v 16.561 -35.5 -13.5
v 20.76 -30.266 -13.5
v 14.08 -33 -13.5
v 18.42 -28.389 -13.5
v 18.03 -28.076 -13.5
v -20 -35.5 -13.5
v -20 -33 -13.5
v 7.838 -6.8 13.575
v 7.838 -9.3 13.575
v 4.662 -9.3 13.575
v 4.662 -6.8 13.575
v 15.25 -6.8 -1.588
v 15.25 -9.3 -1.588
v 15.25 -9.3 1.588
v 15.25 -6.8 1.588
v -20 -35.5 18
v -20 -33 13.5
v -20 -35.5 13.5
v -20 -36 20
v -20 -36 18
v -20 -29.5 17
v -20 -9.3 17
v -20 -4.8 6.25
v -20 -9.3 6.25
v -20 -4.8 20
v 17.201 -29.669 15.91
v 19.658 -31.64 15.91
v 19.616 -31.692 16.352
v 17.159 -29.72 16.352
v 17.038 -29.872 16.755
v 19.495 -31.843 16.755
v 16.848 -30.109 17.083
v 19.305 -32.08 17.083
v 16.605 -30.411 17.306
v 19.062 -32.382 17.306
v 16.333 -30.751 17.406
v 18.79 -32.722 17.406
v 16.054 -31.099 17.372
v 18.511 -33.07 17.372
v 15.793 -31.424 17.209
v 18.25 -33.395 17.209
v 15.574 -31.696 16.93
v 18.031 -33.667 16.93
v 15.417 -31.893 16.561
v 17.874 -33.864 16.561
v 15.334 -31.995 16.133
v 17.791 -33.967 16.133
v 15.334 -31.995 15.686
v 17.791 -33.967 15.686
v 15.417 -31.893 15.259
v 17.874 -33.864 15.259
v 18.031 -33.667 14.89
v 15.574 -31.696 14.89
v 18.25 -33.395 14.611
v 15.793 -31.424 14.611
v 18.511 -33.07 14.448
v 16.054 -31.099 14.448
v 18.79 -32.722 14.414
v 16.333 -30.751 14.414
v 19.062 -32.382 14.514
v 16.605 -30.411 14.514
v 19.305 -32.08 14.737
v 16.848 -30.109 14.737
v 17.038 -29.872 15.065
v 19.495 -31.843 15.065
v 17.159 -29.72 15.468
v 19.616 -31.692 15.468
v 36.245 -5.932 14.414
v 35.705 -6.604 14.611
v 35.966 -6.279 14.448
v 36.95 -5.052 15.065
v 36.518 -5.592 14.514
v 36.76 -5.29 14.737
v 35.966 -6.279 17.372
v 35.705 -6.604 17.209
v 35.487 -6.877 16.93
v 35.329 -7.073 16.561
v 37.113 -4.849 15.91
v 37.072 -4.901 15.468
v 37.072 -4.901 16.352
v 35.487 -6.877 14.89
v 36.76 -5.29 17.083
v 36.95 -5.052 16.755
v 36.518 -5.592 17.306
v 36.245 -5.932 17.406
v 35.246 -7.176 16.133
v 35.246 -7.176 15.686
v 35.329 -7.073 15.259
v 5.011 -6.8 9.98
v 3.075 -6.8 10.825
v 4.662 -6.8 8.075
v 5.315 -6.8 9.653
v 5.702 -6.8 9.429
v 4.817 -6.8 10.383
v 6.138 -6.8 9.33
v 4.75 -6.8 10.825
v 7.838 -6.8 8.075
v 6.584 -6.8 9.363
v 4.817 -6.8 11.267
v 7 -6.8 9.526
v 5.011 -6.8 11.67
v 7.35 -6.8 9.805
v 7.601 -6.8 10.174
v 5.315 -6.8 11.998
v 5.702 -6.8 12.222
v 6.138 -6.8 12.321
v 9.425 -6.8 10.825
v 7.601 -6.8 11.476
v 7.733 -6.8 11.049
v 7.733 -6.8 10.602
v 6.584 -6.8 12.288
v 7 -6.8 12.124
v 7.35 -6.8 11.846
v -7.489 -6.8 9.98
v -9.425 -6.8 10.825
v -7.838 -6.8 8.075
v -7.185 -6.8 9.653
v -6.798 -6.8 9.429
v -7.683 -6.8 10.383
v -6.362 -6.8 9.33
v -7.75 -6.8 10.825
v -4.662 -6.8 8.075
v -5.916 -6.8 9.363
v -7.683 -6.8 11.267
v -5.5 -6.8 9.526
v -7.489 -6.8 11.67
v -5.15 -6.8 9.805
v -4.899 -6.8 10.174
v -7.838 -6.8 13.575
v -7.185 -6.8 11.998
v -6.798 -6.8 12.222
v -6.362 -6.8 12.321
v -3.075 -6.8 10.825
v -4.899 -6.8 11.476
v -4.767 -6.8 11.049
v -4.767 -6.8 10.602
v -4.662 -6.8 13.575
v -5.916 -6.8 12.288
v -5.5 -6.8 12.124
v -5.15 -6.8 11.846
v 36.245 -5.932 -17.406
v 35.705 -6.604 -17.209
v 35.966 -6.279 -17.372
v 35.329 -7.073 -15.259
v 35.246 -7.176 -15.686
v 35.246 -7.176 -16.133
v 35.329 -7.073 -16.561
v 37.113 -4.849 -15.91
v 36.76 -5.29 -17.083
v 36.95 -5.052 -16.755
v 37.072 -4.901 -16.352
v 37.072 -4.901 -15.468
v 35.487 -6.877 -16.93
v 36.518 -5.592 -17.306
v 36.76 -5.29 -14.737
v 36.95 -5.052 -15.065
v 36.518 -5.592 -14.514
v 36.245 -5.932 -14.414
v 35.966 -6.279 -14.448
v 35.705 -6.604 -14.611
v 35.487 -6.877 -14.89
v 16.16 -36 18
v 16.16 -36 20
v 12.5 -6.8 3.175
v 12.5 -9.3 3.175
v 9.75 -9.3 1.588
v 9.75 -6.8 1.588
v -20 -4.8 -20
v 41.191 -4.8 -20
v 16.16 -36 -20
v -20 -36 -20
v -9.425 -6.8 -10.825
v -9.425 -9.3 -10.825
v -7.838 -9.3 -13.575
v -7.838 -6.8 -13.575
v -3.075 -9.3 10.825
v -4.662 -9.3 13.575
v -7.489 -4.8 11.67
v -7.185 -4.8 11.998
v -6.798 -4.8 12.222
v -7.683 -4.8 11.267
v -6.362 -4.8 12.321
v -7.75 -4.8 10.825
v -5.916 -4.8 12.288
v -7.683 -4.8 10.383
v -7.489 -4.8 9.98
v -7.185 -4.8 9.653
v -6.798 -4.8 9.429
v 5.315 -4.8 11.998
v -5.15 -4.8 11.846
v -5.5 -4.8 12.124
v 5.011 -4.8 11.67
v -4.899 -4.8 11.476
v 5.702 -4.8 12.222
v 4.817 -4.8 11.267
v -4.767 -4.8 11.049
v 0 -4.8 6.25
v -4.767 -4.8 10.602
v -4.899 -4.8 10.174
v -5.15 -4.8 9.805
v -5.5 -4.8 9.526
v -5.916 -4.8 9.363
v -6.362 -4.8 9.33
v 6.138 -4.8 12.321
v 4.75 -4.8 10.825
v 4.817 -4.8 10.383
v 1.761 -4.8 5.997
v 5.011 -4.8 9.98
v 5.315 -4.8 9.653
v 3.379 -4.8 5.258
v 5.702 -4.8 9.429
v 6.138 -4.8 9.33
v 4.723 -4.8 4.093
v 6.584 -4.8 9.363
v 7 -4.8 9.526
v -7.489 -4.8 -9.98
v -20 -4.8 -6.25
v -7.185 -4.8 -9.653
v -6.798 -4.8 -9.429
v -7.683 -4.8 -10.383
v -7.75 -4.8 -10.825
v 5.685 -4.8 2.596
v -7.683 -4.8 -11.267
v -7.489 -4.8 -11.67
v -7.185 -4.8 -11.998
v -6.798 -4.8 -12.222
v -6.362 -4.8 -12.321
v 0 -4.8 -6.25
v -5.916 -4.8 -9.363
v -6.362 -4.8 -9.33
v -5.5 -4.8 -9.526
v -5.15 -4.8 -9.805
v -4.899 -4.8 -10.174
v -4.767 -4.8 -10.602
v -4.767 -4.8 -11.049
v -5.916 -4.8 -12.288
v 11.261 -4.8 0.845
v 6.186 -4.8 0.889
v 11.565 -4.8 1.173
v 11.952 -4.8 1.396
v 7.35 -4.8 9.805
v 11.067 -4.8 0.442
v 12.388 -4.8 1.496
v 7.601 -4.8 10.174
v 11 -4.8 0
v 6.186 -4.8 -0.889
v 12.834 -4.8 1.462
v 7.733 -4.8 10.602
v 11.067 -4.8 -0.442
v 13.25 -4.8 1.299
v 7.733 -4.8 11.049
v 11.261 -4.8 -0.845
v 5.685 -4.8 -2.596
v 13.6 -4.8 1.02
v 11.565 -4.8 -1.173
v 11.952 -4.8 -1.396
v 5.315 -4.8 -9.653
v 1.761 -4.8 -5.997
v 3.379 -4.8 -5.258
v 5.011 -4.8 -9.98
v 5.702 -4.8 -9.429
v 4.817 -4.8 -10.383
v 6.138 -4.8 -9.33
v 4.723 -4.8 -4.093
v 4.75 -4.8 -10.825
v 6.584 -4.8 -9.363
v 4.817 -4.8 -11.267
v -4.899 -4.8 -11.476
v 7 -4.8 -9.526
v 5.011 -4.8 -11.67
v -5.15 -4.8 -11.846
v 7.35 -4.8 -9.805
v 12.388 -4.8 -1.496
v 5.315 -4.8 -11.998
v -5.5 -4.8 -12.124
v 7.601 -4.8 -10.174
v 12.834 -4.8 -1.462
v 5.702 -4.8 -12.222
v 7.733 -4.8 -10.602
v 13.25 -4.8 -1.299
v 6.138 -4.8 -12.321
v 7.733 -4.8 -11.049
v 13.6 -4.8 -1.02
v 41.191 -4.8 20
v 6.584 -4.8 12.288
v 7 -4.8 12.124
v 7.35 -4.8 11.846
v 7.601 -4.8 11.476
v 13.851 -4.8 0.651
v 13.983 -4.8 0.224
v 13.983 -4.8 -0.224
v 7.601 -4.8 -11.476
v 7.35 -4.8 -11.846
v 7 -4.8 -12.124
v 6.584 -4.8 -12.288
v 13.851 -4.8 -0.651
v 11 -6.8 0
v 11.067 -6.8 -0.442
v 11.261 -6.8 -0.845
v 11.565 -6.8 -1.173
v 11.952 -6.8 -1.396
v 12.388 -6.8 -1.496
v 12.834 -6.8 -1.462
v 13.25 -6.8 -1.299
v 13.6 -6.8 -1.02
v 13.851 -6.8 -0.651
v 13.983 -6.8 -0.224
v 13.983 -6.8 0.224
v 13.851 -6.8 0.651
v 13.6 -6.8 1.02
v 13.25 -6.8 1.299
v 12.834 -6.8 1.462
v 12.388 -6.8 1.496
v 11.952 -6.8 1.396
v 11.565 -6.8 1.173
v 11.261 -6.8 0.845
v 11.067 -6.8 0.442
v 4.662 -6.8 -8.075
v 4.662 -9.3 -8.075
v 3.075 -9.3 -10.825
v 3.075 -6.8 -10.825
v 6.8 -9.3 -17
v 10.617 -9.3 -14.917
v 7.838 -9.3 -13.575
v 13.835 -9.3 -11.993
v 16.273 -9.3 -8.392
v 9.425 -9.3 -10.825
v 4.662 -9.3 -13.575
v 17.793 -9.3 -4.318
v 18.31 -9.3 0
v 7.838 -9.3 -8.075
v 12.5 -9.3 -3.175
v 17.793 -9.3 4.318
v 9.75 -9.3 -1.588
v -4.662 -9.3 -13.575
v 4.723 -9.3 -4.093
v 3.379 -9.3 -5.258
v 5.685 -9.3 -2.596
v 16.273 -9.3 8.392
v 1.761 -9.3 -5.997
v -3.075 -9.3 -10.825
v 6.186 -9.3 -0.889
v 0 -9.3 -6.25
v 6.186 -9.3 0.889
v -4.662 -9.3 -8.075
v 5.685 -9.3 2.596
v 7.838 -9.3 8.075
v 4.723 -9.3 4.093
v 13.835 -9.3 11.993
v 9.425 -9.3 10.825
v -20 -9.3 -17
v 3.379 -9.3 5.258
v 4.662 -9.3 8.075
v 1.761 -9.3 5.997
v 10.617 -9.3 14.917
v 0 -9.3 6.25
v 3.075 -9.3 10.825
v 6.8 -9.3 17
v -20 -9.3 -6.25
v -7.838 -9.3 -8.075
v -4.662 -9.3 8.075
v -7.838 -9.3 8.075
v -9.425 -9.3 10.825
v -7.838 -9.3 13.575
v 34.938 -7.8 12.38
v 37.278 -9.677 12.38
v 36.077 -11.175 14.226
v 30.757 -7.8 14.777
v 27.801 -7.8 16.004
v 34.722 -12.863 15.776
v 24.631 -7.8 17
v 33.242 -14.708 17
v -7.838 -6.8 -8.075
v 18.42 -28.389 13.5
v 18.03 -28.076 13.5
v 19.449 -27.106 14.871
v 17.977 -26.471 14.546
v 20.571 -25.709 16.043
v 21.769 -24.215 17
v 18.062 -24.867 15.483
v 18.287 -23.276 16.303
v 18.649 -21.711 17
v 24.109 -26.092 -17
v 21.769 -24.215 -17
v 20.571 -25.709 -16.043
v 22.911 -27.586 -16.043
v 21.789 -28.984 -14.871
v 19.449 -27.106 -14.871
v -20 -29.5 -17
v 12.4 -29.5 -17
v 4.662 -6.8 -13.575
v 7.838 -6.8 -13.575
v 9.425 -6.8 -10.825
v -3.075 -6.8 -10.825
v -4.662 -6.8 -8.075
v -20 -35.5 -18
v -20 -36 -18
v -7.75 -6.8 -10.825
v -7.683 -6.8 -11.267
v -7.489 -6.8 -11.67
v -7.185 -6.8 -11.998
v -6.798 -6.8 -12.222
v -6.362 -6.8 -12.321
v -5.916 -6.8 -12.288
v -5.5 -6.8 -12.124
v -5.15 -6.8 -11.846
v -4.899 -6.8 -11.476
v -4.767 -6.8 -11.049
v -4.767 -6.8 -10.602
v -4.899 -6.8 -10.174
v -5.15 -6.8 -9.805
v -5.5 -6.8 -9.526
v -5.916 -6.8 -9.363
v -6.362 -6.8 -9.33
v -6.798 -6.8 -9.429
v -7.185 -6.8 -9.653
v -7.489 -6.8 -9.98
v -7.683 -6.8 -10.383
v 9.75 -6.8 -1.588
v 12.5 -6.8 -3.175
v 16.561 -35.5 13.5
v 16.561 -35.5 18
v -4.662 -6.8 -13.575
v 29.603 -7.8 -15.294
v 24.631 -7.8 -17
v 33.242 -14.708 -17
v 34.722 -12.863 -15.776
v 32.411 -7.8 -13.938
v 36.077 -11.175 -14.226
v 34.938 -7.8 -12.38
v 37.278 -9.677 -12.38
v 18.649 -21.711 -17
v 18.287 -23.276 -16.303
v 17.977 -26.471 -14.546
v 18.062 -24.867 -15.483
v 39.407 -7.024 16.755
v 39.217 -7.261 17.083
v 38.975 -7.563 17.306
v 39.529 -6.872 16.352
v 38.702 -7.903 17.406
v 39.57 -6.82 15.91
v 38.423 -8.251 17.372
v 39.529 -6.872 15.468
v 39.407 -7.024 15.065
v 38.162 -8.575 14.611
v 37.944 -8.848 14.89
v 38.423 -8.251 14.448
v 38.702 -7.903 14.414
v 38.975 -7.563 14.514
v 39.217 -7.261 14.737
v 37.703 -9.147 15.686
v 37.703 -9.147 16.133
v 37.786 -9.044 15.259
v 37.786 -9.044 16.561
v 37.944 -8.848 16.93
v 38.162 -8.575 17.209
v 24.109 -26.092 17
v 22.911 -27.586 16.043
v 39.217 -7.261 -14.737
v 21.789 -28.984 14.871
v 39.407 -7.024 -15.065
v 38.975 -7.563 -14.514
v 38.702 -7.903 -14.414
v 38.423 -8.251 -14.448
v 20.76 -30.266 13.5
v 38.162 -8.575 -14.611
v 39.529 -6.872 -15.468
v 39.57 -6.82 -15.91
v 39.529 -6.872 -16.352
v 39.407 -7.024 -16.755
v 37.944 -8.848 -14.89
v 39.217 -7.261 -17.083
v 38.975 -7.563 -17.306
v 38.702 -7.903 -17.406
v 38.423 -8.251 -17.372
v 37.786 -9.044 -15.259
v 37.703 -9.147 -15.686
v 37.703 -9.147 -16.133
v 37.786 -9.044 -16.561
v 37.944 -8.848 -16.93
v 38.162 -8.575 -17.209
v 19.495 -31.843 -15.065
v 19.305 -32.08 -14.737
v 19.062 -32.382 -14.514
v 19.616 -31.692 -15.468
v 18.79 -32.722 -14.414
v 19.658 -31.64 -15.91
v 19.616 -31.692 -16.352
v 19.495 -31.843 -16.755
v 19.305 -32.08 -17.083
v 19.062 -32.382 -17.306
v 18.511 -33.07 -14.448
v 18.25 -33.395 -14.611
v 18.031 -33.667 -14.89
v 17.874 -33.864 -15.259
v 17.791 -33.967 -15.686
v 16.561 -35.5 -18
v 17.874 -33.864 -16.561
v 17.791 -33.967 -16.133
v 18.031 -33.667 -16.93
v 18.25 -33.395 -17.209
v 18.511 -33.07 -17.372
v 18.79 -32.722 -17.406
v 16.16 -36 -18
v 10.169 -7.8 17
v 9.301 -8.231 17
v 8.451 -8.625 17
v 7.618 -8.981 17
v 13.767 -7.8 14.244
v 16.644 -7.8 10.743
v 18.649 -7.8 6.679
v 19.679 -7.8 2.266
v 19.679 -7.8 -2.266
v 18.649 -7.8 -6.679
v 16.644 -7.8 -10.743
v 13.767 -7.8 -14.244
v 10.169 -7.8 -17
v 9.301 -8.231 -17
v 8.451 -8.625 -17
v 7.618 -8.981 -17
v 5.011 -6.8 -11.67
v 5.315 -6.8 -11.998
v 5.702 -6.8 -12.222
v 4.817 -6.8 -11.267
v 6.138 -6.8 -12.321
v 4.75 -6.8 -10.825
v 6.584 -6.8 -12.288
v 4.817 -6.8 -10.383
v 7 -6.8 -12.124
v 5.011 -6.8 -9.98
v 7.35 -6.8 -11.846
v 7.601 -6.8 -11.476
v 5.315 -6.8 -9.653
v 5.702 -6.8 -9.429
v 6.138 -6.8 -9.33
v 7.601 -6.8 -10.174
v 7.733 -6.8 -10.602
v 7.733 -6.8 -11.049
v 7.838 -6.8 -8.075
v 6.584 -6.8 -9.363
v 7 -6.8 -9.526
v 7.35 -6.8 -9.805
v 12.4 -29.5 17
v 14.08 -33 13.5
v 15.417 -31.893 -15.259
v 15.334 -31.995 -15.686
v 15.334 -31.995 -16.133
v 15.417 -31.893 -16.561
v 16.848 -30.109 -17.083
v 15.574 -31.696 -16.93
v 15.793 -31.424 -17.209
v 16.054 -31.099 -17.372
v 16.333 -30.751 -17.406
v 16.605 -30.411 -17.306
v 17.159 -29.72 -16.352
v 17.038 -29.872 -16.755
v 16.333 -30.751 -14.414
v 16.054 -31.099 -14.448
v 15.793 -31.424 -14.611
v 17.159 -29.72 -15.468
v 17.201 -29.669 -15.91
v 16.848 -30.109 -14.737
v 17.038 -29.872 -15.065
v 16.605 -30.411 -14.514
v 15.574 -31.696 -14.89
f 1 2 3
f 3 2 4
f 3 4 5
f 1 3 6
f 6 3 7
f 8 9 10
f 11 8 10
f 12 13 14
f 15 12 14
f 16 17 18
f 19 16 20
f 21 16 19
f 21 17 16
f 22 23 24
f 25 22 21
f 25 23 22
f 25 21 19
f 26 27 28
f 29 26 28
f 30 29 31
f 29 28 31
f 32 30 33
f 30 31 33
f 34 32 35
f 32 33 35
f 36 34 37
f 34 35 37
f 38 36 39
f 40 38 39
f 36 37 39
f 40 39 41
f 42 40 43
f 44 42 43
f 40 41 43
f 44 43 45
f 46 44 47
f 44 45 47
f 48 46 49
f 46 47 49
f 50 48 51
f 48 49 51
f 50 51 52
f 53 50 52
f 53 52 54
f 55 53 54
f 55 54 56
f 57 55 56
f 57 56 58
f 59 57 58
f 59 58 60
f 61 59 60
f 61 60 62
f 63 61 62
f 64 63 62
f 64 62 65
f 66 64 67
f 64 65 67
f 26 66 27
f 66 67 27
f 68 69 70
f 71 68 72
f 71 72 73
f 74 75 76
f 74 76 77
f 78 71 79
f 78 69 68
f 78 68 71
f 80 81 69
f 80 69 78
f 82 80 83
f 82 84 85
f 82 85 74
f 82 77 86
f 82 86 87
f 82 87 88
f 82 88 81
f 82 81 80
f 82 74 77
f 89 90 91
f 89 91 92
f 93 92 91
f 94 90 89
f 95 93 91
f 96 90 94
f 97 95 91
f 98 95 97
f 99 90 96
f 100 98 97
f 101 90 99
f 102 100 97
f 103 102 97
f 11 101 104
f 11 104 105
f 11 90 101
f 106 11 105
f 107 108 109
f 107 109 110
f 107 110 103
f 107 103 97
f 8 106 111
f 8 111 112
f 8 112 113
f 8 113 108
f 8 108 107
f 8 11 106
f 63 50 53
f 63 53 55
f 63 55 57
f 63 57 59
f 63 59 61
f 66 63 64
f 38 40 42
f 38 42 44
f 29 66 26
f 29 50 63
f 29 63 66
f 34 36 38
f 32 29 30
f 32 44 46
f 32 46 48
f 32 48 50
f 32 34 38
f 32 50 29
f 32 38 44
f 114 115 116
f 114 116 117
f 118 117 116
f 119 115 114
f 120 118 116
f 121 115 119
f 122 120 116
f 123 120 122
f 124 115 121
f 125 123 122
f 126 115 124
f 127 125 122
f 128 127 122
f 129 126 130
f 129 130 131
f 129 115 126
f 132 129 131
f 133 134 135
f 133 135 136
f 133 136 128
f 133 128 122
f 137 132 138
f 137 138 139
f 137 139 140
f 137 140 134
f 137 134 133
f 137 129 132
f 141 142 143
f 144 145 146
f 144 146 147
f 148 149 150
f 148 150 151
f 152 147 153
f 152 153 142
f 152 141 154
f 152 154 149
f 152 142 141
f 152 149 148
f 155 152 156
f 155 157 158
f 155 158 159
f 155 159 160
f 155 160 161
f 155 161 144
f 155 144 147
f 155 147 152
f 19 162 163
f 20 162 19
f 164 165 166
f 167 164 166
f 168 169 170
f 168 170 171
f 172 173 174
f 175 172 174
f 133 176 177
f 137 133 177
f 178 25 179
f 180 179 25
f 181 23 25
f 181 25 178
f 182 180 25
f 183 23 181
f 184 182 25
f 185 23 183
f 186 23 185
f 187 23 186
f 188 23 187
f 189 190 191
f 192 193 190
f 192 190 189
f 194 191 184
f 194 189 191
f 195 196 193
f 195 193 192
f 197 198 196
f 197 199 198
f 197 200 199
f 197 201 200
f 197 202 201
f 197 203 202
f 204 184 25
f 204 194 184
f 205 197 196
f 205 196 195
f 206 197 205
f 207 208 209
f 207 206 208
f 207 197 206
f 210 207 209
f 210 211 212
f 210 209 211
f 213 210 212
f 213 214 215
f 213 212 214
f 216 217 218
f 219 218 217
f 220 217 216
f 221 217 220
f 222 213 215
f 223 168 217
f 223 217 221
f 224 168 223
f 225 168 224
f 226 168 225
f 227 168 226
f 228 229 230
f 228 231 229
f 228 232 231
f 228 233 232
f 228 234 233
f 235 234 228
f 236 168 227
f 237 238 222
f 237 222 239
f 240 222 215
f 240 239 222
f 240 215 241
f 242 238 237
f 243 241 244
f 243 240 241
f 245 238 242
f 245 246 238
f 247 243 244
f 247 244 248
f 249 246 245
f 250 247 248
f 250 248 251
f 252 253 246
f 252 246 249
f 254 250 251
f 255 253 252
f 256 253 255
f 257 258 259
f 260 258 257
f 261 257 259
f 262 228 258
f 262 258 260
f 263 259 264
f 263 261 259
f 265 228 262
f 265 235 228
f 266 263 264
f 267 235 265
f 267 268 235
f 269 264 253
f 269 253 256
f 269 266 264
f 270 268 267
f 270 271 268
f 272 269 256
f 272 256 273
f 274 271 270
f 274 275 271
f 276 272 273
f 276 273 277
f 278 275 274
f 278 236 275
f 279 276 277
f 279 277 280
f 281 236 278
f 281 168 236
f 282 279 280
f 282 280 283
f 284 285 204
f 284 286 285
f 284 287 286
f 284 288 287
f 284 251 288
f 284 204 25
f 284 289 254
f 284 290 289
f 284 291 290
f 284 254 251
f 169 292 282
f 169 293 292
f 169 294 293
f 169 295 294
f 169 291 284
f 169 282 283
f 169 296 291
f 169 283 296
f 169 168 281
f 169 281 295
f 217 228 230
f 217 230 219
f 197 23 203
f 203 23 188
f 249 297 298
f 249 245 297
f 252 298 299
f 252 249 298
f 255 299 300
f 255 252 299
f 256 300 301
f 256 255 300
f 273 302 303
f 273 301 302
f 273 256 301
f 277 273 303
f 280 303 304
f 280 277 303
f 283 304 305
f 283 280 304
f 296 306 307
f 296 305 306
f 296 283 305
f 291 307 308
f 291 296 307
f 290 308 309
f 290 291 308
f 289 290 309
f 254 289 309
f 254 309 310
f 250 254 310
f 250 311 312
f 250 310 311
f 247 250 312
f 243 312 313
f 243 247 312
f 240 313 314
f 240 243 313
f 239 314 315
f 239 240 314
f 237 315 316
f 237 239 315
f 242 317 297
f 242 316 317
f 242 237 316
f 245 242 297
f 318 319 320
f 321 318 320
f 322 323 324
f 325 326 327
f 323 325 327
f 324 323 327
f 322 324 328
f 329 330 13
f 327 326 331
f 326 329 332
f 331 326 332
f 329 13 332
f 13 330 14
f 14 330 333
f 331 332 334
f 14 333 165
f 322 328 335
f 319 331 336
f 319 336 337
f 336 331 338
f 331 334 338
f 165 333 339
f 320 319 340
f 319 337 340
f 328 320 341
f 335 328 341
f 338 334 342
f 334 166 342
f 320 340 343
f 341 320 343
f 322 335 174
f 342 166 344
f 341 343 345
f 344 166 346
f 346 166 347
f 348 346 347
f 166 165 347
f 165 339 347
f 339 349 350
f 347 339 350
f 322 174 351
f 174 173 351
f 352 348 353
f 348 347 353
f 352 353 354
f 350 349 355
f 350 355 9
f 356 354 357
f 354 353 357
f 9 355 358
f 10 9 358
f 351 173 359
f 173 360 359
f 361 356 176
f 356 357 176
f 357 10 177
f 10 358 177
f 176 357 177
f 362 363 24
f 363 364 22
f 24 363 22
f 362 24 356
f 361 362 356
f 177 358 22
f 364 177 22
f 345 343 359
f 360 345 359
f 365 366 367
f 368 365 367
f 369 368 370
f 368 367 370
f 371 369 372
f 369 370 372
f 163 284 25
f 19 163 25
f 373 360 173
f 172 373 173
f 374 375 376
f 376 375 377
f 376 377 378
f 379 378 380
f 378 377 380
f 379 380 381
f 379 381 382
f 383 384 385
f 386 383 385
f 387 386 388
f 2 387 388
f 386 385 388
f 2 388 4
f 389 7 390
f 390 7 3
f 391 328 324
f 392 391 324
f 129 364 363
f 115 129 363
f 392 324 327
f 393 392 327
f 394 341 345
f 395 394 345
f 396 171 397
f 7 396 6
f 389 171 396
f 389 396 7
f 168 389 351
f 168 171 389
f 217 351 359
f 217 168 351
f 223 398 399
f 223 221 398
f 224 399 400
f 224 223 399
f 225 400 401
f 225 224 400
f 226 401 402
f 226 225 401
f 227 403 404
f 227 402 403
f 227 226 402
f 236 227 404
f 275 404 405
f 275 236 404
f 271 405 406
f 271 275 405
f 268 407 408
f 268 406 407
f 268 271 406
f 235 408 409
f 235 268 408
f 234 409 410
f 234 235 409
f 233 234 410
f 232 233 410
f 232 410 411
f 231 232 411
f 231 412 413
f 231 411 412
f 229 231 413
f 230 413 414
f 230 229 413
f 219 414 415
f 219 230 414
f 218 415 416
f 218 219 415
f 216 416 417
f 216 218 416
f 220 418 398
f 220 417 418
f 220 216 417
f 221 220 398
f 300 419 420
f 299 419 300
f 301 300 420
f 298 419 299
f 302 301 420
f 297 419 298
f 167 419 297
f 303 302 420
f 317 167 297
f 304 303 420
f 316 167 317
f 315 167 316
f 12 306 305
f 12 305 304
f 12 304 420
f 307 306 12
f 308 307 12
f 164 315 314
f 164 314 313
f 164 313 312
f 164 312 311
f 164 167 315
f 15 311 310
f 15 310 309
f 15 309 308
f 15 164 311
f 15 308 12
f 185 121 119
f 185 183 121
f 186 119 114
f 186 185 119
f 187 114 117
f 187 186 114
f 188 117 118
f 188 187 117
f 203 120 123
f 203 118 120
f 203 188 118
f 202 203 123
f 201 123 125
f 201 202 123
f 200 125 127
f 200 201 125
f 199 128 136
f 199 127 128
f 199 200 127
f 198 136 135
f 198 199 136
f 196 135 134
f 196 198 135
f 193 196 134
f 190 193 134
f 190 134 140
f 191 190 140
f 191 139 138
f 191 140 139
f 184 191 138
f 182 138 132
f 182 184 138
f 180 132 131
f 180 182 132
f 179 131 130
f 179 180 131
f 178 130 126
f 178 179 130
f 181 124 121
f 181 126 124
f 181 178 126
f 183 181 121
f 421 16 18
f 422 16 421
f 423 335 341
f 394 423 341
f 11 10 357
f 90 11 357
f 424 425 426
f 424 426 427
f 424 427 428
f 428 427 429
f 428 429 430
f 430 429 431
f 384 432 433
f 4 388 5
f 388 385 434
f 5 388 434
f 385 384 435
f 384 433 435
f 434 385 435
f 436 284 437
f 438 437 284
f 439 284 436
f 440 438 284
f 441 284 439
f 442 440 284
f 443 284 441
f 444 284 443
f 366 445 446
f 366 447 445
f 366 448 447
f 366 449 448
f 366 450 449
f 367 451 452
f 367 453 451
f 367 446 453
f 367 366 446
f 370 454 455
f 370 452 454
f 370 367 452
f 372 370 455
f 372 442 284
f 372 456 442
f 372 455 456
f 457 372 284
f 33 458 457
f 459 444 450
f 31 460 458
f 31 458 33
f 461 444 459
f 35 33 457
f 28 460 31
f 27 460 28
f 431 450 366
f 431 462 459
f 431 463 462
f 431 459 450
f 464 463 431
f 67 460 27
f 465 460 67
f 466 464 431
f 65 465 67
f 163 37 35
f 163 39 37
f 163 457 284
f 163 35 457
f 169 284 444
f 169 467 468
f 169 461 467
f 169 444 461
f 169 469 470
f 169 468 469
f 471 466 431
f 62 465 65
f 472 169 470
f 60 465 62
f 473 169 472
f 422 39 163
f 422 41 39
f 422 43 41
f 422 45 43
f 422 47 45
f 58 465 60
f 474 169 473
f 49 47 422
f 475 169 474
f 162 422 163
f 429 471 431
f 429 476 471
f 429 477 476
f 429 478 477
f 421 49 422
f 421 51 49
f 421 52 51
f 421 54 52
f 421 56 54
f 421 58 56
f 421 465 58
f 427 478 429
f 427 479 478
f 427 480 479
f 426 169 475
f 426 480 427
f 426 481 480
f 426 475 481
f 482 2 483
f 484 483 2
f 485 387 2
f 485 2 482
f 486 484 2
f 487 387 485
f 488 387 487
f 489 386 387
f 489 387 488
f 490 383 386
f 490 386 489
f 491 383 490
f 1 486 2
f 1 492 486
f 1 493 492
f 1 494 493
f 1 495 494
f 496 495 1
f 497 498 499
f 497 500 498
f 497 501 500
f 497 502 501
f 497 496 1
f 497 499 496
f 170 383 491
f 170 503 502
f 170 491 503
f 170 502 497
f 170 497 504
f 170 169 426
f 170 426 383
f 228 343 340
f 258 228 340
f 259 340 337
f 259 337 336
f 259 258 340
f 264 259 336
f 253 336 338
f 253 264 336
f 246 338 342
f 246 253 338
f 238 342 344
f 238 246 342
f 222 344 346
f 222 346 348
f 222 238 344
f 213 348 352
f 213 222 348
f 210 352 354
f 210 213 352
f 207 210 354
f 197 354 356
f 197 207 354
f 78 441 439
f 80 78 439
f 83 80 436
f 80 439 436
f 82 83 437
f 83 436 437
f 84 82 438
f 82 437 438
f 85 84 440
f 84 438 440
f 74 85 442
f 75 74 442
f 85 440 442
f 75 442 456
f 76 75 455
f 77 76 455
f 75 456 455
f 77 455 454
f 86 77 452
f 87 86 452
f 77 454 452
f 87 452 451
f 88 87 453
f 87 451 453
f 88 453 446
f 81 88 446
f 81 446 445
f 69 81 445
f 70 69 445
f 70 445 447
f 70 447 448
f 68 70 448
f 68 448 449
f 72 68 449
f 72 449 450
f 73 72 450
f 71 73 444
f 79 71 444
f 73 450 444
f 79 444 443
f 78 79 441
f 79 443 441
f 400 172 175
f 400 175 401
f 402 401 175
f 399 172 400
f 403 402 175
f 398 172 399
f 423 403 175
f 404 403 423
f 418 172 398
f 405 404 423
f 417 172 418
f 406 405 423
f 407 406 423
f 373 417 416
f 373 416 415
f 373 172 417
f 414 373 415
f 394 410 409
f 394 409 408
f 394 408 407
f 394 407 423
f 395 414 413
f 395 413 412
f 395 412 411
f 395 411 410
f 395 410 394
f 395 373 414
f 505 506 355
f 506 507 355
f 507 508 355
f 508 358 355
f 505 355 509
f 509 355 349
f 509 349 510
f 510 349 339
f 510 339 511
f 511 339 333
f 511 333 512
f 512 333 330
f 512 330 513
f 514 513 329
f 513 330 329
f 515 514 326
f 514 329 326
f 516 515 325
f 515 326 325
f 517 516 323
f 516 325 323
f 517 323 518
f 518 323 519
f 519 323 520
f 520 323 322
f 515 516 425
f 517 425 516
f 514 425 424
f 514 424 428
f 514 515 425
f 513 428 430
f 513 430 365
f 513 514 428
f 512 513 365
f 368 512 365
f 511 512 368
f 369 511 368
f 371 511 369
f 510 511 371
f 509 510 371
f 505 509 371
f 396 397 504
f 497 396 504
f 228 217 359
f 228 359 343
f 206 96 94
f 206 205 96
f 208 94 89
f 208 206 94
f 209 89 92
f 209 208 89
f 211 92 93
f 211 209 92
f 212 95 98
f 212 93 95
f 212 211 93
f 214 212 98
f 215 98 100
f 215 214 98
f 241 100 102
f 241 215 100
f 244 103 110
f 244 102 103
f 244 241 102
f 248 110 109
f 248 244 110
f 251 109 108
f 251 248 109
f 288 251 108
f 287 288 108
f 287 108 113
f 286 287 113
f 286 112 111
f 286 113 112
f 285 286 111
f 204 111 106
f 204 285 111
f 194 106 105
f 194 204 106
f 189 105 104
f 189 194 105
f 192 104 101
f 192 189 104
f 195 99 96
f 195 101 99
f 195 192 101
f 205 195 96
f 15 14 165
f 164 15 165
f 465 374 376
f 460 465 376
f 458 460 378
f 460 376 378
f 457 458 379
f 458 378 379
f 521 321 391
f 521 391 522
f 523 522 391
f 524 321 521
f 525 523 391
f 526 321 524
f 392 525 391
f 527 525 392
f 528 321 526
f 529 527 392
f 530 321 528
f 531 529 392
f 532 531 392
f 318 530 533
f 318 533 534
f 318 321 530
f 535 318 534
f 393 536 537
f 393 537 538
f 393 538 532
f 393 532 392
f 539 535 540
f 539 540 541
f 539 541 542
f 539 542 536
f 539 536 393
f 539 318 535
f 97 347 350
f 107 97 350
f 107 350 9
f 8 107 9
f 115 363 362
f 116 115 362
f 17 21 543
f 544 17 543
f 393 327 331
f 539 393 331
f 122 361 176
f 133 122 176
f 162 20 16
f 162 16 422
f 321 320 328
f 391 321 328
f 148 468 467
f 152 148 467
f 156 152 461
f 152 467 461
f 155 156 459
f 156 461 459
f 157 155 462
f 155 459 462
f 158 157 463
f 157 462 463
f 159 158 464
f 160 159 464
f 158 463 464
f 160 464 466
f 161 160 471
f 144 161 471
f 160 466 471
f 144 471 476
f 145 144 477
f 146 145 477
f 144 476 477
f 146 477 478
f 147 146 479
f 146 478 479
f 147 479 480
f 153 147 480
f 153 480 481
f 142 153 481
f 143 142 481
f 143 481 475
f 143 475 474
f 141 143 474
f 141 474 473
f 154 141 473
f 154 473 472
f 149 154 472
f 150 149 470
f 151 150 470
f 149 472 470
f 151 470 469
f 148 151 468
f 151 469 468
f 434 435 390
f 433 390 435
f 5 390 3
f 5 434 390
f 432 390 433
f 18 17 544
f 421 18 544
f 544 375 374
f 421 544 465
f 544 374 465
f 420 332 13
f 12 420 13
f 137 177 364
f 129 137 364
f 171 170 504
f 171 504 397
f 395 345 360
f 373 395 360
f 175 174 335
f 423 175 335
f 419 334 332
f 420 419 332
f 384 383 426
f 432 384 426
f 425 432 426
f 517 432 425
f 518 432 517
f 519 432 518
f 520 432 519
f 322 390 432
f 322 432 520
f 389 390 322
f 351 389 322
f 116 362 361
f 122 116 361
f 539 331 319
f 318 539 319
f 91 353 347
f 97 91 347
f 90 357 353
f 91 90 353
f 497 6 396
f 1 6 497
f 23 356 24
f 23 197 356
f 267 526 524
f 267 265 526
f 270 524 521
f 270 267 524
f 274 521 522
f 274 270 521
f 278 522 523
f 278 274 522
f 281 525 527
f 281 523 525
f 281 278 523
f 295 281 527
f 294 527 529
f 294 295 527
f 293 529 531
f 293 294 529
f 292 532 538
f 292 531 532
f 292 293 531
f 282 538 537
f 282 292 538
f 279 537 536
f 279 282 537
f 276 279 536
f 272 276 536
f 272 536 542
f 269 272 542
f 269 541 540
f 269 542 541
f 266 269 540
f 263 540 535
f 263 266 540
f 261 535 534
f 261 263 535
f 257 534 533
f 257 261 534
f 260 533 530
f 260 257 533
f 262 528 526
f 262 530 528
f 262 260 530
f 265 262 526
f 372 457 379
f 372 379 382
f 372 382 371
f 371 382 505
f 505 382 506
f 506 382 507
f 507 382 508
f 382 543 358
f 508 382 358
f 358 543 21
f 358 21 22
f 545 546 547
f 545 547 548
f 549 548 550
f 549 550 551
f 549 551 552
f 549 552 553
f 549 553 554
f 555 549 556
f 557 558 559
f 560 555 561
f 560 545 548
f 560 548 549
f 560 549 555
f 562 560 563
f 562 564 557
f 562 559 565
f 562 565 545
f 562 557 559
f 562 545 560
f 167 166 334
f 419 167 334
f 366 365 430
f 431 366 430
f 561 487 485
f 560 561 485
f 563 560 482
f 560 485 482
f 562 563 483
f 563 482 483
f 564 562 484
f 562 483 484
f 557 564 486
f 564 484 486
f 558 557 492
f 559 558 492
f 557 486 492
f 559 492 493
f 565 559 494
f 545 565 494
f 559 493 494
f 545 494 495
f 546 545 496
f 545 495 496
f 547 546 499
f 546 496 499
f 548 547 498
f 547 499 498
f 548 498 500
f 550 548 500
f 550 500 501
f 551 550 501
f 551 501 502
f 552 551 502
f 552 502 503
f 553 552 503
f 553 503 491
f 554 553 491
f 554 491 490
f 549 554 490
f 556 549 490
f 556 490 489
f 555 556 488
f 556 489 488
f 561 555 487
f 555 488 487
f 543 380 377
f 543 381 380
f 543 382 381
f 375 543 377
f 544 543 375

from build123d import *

# Parameters (mm, degrees)
BOSS_EXTRUDE1_DEPTH            = 20
BOSS_EXTRUDE1_DEPTH_BACK       = 20
CUT_EXTRUDE1_REACH             = 75.759
SKETCH3_W                      = 34
SKETCH3_H                      = 25.2
CUT_EXTRUDE2_DEPTH             = 3
CUT_EXTRUDE3_REACH             = 57.409
CUT_EXTRUDE4_REACH             = 57.409
SKETCH7_R                      = 1.5
SKETCH6_R                      = 1.5
BOSS_EXTRUDE2_DEPTH            = 1.5
CHAMFER3_SIZE                  = 1.5
CUT_EXTRUDE5_DEPTH             = 2.5
CUT_EXTRUDE6_REACH             = 55.777
SKETCH9_W                      = 44.905987645
SKETCH9_H                      = 27
CUT_EXTRUDE6_DIRECTION_2_REACH = 55.777
BOSS_EXTRUDE3_REACH            = 53.8
CHAMFER1_SIZE                  = 4
CHAMFER2_SIZE                  = 3.5
SKETCH11_W                     = 40.505645026
SKETCH11_H                     = 4.5
CUT_EXTRUDE7_DEPTH             = 0.5
SKETCH13_R                     = 1.5
CUT_EXTRUDE8_DEPTH             = 3.15


# Some blends are built 0.0001 mm under size
with BuildPart() as part:
    # Sketch1 → Boss-Extrude1 (new, two sides: drawn at the far end of the back side and taken through both)
    with BuildSketch(Plane.XY.offset(-BOSS_EXTRUDE1_DEPTH_BACK)):
        Polygon((-20, -4.8), (41.191180555, -4.8), (16.16, -36), (-20, -36), align=None)
    extrude(amount=BOSS_EXTRUDE1_DEPTH + BOSS_EXTRUDE1_DEPTH_BACK)

    # Cut-Extrude1: up to this plane
    cut_extrude1_end = Plane(origin=(38.851180555, -2.922661458, -20), z_dir=(0.7799999999999999, -0.6257795138864808, 0))
    # Sketch3 → Cut-Extrude1 (cut, up to the surface)
    with BuildSketch(Plane.ZY.offset(20), mode=Mode.PRIVATE) as cut_extrude1_sk1:
        with Locations((0, -20.4)):
            Rectangle(SKETCH3_W, SKETCH3_H)
    cut_extrude1_tool1 = split(extrude(cut_extrude1_sk1.sketch, amount=-CUT_EXTRUDE1_REACH, mode=Mode.PRIVATE), bisect_by=cut_extrude1_end, keep=Keep.BOTH, mode=Mode.PRIVATE)
    add(cut_extrude1_tool1.solids().sort_by_distance((-20, -20.4, 0))[0], mode=Mode.SUBTRACT)

    # Sketch4 → Cut-Extrude2 (cut)
    with BuildSketch(Plane(origin=(25.06363275, -20.108087075, 0), x_dir=(0, 0, 1), z_dir=(-0.78, 0.6257795138864807, 0))):
        with BuildLine():
            Line((-17, 9.329856704), (-17, -5.264662815))
            ThreePointArc((-17, -5.264662815), (0, -16.467403056), (17, -5.264662815))
            Line((17, -5.264662815), (17, 9.329856704))
            ThreePointArc((17, 9.329856704), (15.039919545, 12.805285563), (12.38022373, 15.779598814))
            Line((12.38022373, 15.779598814), (-12.38022373, 15.779598814))
            ThreePointArc((-12.38022373, 15.779598814), (-15.039919545, 12.805285563), (-17, 9.329856704))
        make_face()
    extrude(amount=-CUT_EXTRUDE2_DEPTH, mode=Mode.SUBTRACT)

    # Sketch5 → Cut-Extrude3 (cut, up to next)
    with BuildSketch(Plane(origin=(0, -4.8, 0), x_dir=(1, 0, 0), z_dir=(0, 1, 0)), mode=Mode.PRIVATE) as cut_extrude3_sk1:
        with BuildLine():
            Line((0, 6.25), (-20, 6.25))
            Line((-20, 6.25), (-20, -6.25))
            Line((-20, -6.25), (0, -6.25))
            ThreePointArc((0, -6.25), (6.25, 0), (0, 6.25))
        make_face()
    cut_extrude3_tool1 = extrude(cut_extrude3_sk1.sketch, amount=-CUT_EXTRUDE3_REACH, mode=Mode.PRIVATE) & part.part
    add(cut_extrude3_tool1.solids().sort_by_distance((-7.506569, -4.8, 0))[0], mode=Mode.SUBTRACT)

    # Cut-Extrude4: up to this face of the body (flat: up to its plane)
    cut_extrude4_end = Plane(part.part.faces().sort_by_distance((-1.92, -36, 0))[0])
    # Sketch7 → Cut-Extrude4 (cut, up to the picked face)
    with BuildSketch(Plane(origin=(0, -4.8, 0), x_dir=(1, 0, 0), z_dir=(0, 1, 0)), mode=Mode.PRIVATE) as cut_extrude4_sk1:
        with Locations(Location((12.5, 0, 0), (0, 0, 180))):
            Circle(SKETCH7_R)
    cut_extrude4_tool1 = split(extrude(cut_extrude4_sk1.sketch, amount=-CUT_EXTRUDE4_REACH, mode=Mode.PRIVATE), bisect_by=cut_extrude4_end, keep=Keep.BOTH, mode=Mode.PRIVATE)
    # Sketch7 → Cut-Extrude4 (cut, up to the picked face)
    with BuildSketch(Plane(origin=(0, -4.8, 0), x_dir=(1, 0, 0), z_dir=(0, 1, 0)), mode=Mode.PRIVATE) as cut_extrude4_sk2:
        with Locations(Location((6.25, -10.825317547, 0), (0, 0, 180))):
            Circle(SKETCH7_R)
    cut_extrude4_tool2 = split(extrude(cut_extrude4_sk2.sketch, amount=-CUT_EXTRUDE4_REACH, mode=Mode.PRIVATE), bisect_by=cut_extrude4_end, keep=Keep.BOTH, mode=Mode.PRIVATE)
    # Sketch7 → Cut-Extrude4 (cut, up to the picked face)
    with BuildSketch(Plane(origin=(0, -4.8, 0), x_dir=(1, 0, 0), z_dir=(0, 1, 0)), mode=Mode.PRIVATE) as cut_extrude4_sk3:
        with Locations(Location((-6.25, -10.825317547, 0), (0, 0, 180))):
            Circle(SKETCH7_R)
    cut_extrude4_tool3 = split(extrude(cut_extrude4_sk3.sketch, amount=-CUT_EXTRUDE4_REACH, mode=Mode.PRIVATE), bisect_by=cut_extrude4_end, keep=Keep.BOTH, mode=Mode.PRIVATE)
    # Sketch7 → Cut-Extrude4 (cut, up to the picked face)
    with BuildSketch(Plane(origin=(0, -4.8, 0), x_dir=(1, 0, 0), z_dir=(0, 1, 0)), mode=Mode.PRIVATE) as cut_extrude4_sk4:
        with Locations((-12.5, 0)):
            Circle(SKETCH7_R)
    cut_extrude4_tool4 = split(extrude(cut_extrude4_sk4.sketch, amount=-CUT_EXTRUDE4_REACH, mode=Mode.PRIVATE), bisect_by=cut_extrude4_end, keep=Keep.BOTH, mode=Mode.PRIVATE)
    # Sketch7 → Cut-Extrude4 (cut, up to the picked face)
    with BuildSketch(Plane(origin=(0, -4.8, 0), x_dir=(1, 0, 0), z_dir=(0, 1, 0)), mode=Mode.PRIVATE) as cut_extrude4_sk5:
        with Locations(Location((-6.25, 10.825317547, 0), (0, 0, 180))):
            Circle(SKETCH7_R)
    cut_extrude4_tool5 = split(extrude(cut_extrude4_sk5.sketch, amount=-CUT_EXTRUDE4_REACH, mode=Mode.PRIVATE), bisect_by=cut_extrude4_end, keep=Keep.BOTH, mode=Mode.PRIVATE)
    # Sketch7 → Cut-Extrude4 (cut, up to the picked face)
    with BuildSketch(Plane(origin=(0, -4.8, 0), x_dir=(1, 0, 0), z_dir=(0, 1, 0)), mode=Mode.PRIVATE) as cut_extrude4_sk6:
        with Locations(Location((6.25, 10.825317547, 0), (0, 0, 180))):
            Circle(SKETCH7_R)
    cut_extrude4_tool6 = split(extrude(cut_extrude4_sk6.sketch, amount=-CUT_EXTRUDE4_REACH, mode=Mode.PRIVATE), bisect_by=cut_extrude4_end, keep=Keep.BOTH, mode=Mode.PRIVATE)
    add(cut_extrude4_tool1.solids().sort_by(Axis((12.5, -4.8, 0), (0, -1, 0)))[0], mode=Mode.SUBTRACT)
    add(cut_extrude4_tool2.solids().sort_by(Axis((6.25, -4.8, 10.825318), (0, -1, 0)))[0], mode=Mode.SUBTRACT)
    add(cut_extrude4_tool3.solids().sort_by(Axis((-6.25, -4.8, 10.825318), (0, -1, 0)))[0], mode=Mode.SUBTRACT)
    add(cut_extrude4_tool4.solids().sort_by(Axis((-12.5, -4.8, 0), (0, -1, 0)))[0], mode=Mode.SUBTRACT)
    add(cut_extrude4_tool5.solids().sort_by(Axis((-6.25, -4.8, -10.825318), (0, -1, 0)))[0], mode=Mode.SUBTRACT)
    add(cut_extrude4_tool6.solids().sort_by(Axis((6.25, -4.8, -10.825318), (0, -1, 0)))[0], mode=Mode.SUBTRACT)

    # Sketch6 → Boss-Extrude2 (add)
    with BuildSketch(Plane.XZ.offset(7.8)):
        with BuildLine():
            Line((0, 6.25), (-17.209749811, 6.25))
            Line((-17.209749811, 6.25), (-20, 6.25))
            Line((-20, 6.25), (-20, 18.309505416))
            Line((-20, 18.309505416), (0, 18.309505416))
            ThreePointArc((0, 18.309505416), (18.309505416, 0), (0, -18.309505416))
            Line((0, -18.309505416), (-20, -18.309505416))
            Line((-20, -18.309505416), (-20, -6.25))
            Line((-20, -6.25), (-17.209749811, -6.25))
            Line((-17.209749811, -6.25), (0, -6.25))
            ThreePointArc((0, -6.25), (6.25, 0), (0, 6.25))
        make_face()
        with Locations(Location((-6.25, 10.825317547, 0), (0, 0, 180))):
            Circle(SKETCH6_R, mode=Mode.SUBTRACT)
        with Locations(Location((6.25, 10.825317547, 0), (0, 0, 180))):
            Circle(SKETCH6_R, mode=Mode.SUBTRACT)
        with Locations(Location((12.5, 0, 0), (0, 0, 180))):
            Circle(SKETCH6_R, mode=Mode.SUBTRACT)
        with Locations(Location((6.25, -10.825317547, 0), (0, 0, 180))):
            Circle(SKETCH6_R, mode=Mode.SUBTRACT)
        with Locations(Location((-6.25, -10.825317547, 0), (0, 0, 180))):
            Circle(SKETCH6_R, mode=Mode.SUBTRACT)
    extrude(amount=BOSS_EXTRUDE2_DEPTH)

    # Chamfer3
    chamfer3_edges = [part.edges().sort_by_distance(p)[0] for p in [
        (18.309505416, -7.8, 0),
    ]]
    chamfer(chamfer3_edges, length=CHAMFER3_SIZE - 0.0001)  # a hair under: the kernel refuses the full size

    # Sketch8 → Cut-Extrude5 (cut)
    with BuildSketch(Plane.XZ.offset(9.3)):
        Polygon((12.5, 3.175426481), (9.75, 1.58771324), (9.75, -1.58771324), (12.5, -3.175426481), (15.25, -1.58771324), (15.25, 1.58771324), align=None)
        Polygon((9.425426481, 10.825317547), (7.83771324, 13.575317547), (4.66228676, 13.575317547), (3.074573519, 10.825317547), (4.66228676, 8.075317547), (7.83771324, 8.075317547), align=None)
        Polygon((-3.074573519, 10.825317547), (-4.66228676, 13.575317547), (-7.83771324, 13.575317547), (-9.425426481, 10.825317547), (-7.83771324, 8.075317547), (-4.66228676, 8.075317547), align=None)
        Polygon((-3.074573519, -10.825317547), (-4.66228676, -8.075317547), (-7.83771324, -8.075317547), (-9.425426481, -10.825317547), (-7.83771324, -13.575317547), (-4.66228676, -13.575317547), align=None)
        Polygon((9.425426481, -10.825317547), (7.83771324, -8.075317547), (4.66228676, -8.075317547), (3.074573519, -10.825317547), (4.66228676, -13.575317547), (7.83771324, -13.575317547), align=None)
    extrude(amount=-CUT_EXTRUDE5_DEPTH, mode=Mode.SUBTRACT)

    # Sketch9 → Cut-Extrude6 (cut, up to next)
    with BuildSketch(Plane(origin=(0, -33, 0), x_dir=(1, 0, 0), z_dir=(0, 1, 0)), mode=Mode.PRIVATE) as cut_extrude6_sk1:
        with Locations((2.452993823, 0)):
            Rectangle(SKETCH9_W, SKETCH9_H)
    cut_extrude6_tool1 = extrude(cut_extrude6_sk1.sketch, amount=-CUT_EXTRUDE6_REACH, mode=Mode.PRIVATE) & part.part
    add(cut_extrude6_tool1.solids().sort_by_distance((2.452994, -33, 0))[0], mode=Mode.SUBTRACT)

    # Sketch9 → Cut-Extrude6 direction 2 (cut, up to next)
    with BuildSketch(Plane(origin=(0, -33, 0), x_dir=(1, 0, 0), z_dir=(0, 1, 0)), mode=Mode.PRIVATE) as cut_extrude6_direction_2_sk1:
        with Locations((2.452993823, 0)):
            Rectangle(SKETCH9_W, SKETCH9_H)
    cut_extrude6_direction_2_tool1 = extrude(cut_extrude6_direction_2_sk1.sketch, amount=CUT_EXTRUDE6_DIRECTION_2_REACH, mode=Mode.PRIVATE) & part.part
    add(cut_extrude6_direction_2_tool1.solids().sort_by_distance((2.452994, -33, 0))[0], mode=Mode.SUBTRACT)

    # Sketch10 → Boss-Extrude3 (add, up to next)
    with BuildSketch(Plane(origin=(25.06363275, -20.108087075, 0), x_dir=(0, 0, 1), z_dir=(-0.78, 0.6257795138864807, 0)), mode=Mode.PRIVATE) as boss_extrude3_sk1:
        with BuildLine():
            Line((17, 9.329856704), (17, 15.779598814))
            Line((17, 15.779598814), (12.38022373, 15.779598814))
            ThreePointArc((12.38022373, 15.779598814), (15.039919545, 12.805285563), (17, 9.329856704))
        make_face()
    boss_extrude3_tool1 = extrude(boss_extrude3_sk1.sketch, amount=BOSS_EXTRUDE3_REACH, mode=Mode.PRIVATE) - part.part
    # Sketch10 → Boss-Extrude3 (add, up to next)
    with BuildSketch(Plane(origin=(25.06363275, -20.108087075, 0), x_dir=(0, 0, 1), z_dir=(-0.78, 0.6257795138864807, 0)), mode=Mode.PRIVATE) as boss_extrude3_sk2:
        with BuildLine():
            Line((-12.38022373, 15.779598814), (-17, 15.779598814))
            Line((-17, 15.779598814), (-17, 9.329856704))
            ThreePointArc((-17, 9.329856704), (-15.039919545, 12.805285563), (-12.38022373, 15.779598814))
        make_face()
    boss_extrude3_tool2 = extrude(boss_extrude3_sk2.sketch, amount=BOSS_EXTRUDE3_REACH, mode=Mode.PRIVATE) - part.part
    add(boss_extrude3_tool1.solids().sort_by_distance((33.70308, -9.339488, 15.573959))[0])
    add(boss_extrude3_tool2.solids().sort_by_distance((33.70308, -9.339488, -15.573959))[0])

    # Chamfer1
    # the kernel refuses this chamfer: 4 mm, written as the material it adds along each edge
    with BuildSketch(Plane(origin=(28.206340733, -16.190873148, -17), x_dir=(-0.7797050951908114, 0.6255429172350234, -0.02749587661058647), z_dir=(-0.6257795138864808, -0.7799999999999999, 0))) as chamfer1_piece_1_section:
        Polygon((CHAMFER1_SIZE * 0.999621916911, -CHAMFER1_SIZE * 0.0274958766106), (-CHAMFER1_SIZE * 0.0274958766106, -CHAMFER1_SIZE * 0.999621916911), (0, 0), align=None)
    chamfer1_piece_1 = extrude(amount=31.836894582, mode=Mode.PRIVATE)
    chamfer1_piece_1 = split(chamfer1_piece_1, bisect_by=Plane(origin=(16.061091739, -28.954015424, -13.5), z_dir=(0, 0, -1)), keep=Keep.TOP, mode=Mode.PRIVATE)
    chamfer1_piece_1 = split(chamfer1_piece_1, bisect_by=Plane(origin=(16.061091739, -33, -15.864251998), z_dir=(0, 1, 0)), keep=Keep.TOP, mode=Mode.PRIVATE)
    chamfer1_piece_1 = chamfer1_piece_1 - Plane(origin=(25.176212906, -17.592514525, 0), x_dir=(-0.24683652243813084, -0.30766824932634074, -0.9189189189189191), z_dir=(-0.78, 0.6257795138864807, 0)) * Cylinder(18.5, 80, mode=Mode.PRIVATE)
    add(chamfer1_piece_1)
    with BuildSketch(Plane(origin=(8.283464318, -41.023650922, 17), x_dir=(-0.7797050951908113, 0.6255429172350233, 0.02749587661058642), z_dir=(0.6257795138864808, 0.7799999999999999, 0))) as chamfer1_piece_2_section:
        Polygon((CHAMFER1_SIZE * 0.999621916911, -CHAMFER1_SIZE * 0.0274958766106), (-CHAMFER1_SIZE * 0.0274958766106, -CHAMFER1_SIZE * 0.999621916911), (0, 0), align=None)
    chamfer1_piece_2 = extrude(amount=31.836894582, mode=Mode.PRIVATE)
    chamfer1_piece_2 = split(chamfer1_piece_2, bisect_by=Plane(origin=(16.061091739, -28.954015425, 13.5), z_dir=(0, 0, 1)), keep=Keep.TOP, mode=Mode.PRIVATE)
    chamfer1_piece_2 = chamfer1_piece_2 - Plane(origin=(25.176212906, -17.592514525, 0), x_dir=(-0.24683652243813084, -0.30766824932634074, -0.9189189189189191), z_dir=(-0.78, 0.6257795138864807, 0)) * Cylinder(18.5, 80, mode=Mode.PRIVATE)
    chamfer1_piece_2 = split(chamfer1_piece_2, bisect_by=Plane(origin=(16.061091739, -33, 15.864251998), z_dir=(0, 1, 0)), keep=Keep.TOP, mode=Mode.PRIVATE)
    add(chamfer1_piece_2)

    # Chamfer2
    chamfer2_edges = [part.edges().sort_by_distance(p)[0] for p in [
        (-5.203757345, -33, -17),
        (-5.203757345, -33, 17),
    ]]
    chamfer(chamfer2_edges, length=CHAMFER2_SIZE - 0.0001)  # a hair under: the kernel refuses the full size

    # Sketch11 → Cut-Extrude7 (cut)
    with BuildSketch(Plane.XZ.offset(36)):
        with Locations((0.252822513, 15.75)):
            Rectangle(SKETCH11_W, SKETCH11_H)
        with Locations((0.252822513, -15.75)):
            Rectangle(SKETCH11_W, SKETCH11_H)
    extrude(amount=-CUT_EXTRUDE7_DEPTH, mode=Mode.SUBTRACT)

    # Sketch13 → Cut-Extrude8 (cut)
    with BuildSketch(Plane(origin=(27.40363275, -21.985425617, 0), x_dir=(0, 0, -1), z_dir=(0.7799999999999998, -0.6257795138864808, 0))):
        with Locations(Location((-15.909902577, 17.942499521, 0), (0, 0, 90))):
            Circle(SKETCH13_R)
        with Locations(Location((15.909902577, 17.942499521, 0), (0, 0, 90))):
            Circle(SKETCH13_R)
        with Locations(Location((15.909902577, -13.877305632, 0), (0, 0, 90))):
            Circle(SKETCH13_R)
        with Locations(Location((-15.909902577, -13.877305632, 0), (0, 0, 90))):
            Circle(SKETCH13_R)
    extrude(amount=-CUT_EXTRUDE8_DEPTH, mode=Mode.SUBTRACT)


solid = part.part
